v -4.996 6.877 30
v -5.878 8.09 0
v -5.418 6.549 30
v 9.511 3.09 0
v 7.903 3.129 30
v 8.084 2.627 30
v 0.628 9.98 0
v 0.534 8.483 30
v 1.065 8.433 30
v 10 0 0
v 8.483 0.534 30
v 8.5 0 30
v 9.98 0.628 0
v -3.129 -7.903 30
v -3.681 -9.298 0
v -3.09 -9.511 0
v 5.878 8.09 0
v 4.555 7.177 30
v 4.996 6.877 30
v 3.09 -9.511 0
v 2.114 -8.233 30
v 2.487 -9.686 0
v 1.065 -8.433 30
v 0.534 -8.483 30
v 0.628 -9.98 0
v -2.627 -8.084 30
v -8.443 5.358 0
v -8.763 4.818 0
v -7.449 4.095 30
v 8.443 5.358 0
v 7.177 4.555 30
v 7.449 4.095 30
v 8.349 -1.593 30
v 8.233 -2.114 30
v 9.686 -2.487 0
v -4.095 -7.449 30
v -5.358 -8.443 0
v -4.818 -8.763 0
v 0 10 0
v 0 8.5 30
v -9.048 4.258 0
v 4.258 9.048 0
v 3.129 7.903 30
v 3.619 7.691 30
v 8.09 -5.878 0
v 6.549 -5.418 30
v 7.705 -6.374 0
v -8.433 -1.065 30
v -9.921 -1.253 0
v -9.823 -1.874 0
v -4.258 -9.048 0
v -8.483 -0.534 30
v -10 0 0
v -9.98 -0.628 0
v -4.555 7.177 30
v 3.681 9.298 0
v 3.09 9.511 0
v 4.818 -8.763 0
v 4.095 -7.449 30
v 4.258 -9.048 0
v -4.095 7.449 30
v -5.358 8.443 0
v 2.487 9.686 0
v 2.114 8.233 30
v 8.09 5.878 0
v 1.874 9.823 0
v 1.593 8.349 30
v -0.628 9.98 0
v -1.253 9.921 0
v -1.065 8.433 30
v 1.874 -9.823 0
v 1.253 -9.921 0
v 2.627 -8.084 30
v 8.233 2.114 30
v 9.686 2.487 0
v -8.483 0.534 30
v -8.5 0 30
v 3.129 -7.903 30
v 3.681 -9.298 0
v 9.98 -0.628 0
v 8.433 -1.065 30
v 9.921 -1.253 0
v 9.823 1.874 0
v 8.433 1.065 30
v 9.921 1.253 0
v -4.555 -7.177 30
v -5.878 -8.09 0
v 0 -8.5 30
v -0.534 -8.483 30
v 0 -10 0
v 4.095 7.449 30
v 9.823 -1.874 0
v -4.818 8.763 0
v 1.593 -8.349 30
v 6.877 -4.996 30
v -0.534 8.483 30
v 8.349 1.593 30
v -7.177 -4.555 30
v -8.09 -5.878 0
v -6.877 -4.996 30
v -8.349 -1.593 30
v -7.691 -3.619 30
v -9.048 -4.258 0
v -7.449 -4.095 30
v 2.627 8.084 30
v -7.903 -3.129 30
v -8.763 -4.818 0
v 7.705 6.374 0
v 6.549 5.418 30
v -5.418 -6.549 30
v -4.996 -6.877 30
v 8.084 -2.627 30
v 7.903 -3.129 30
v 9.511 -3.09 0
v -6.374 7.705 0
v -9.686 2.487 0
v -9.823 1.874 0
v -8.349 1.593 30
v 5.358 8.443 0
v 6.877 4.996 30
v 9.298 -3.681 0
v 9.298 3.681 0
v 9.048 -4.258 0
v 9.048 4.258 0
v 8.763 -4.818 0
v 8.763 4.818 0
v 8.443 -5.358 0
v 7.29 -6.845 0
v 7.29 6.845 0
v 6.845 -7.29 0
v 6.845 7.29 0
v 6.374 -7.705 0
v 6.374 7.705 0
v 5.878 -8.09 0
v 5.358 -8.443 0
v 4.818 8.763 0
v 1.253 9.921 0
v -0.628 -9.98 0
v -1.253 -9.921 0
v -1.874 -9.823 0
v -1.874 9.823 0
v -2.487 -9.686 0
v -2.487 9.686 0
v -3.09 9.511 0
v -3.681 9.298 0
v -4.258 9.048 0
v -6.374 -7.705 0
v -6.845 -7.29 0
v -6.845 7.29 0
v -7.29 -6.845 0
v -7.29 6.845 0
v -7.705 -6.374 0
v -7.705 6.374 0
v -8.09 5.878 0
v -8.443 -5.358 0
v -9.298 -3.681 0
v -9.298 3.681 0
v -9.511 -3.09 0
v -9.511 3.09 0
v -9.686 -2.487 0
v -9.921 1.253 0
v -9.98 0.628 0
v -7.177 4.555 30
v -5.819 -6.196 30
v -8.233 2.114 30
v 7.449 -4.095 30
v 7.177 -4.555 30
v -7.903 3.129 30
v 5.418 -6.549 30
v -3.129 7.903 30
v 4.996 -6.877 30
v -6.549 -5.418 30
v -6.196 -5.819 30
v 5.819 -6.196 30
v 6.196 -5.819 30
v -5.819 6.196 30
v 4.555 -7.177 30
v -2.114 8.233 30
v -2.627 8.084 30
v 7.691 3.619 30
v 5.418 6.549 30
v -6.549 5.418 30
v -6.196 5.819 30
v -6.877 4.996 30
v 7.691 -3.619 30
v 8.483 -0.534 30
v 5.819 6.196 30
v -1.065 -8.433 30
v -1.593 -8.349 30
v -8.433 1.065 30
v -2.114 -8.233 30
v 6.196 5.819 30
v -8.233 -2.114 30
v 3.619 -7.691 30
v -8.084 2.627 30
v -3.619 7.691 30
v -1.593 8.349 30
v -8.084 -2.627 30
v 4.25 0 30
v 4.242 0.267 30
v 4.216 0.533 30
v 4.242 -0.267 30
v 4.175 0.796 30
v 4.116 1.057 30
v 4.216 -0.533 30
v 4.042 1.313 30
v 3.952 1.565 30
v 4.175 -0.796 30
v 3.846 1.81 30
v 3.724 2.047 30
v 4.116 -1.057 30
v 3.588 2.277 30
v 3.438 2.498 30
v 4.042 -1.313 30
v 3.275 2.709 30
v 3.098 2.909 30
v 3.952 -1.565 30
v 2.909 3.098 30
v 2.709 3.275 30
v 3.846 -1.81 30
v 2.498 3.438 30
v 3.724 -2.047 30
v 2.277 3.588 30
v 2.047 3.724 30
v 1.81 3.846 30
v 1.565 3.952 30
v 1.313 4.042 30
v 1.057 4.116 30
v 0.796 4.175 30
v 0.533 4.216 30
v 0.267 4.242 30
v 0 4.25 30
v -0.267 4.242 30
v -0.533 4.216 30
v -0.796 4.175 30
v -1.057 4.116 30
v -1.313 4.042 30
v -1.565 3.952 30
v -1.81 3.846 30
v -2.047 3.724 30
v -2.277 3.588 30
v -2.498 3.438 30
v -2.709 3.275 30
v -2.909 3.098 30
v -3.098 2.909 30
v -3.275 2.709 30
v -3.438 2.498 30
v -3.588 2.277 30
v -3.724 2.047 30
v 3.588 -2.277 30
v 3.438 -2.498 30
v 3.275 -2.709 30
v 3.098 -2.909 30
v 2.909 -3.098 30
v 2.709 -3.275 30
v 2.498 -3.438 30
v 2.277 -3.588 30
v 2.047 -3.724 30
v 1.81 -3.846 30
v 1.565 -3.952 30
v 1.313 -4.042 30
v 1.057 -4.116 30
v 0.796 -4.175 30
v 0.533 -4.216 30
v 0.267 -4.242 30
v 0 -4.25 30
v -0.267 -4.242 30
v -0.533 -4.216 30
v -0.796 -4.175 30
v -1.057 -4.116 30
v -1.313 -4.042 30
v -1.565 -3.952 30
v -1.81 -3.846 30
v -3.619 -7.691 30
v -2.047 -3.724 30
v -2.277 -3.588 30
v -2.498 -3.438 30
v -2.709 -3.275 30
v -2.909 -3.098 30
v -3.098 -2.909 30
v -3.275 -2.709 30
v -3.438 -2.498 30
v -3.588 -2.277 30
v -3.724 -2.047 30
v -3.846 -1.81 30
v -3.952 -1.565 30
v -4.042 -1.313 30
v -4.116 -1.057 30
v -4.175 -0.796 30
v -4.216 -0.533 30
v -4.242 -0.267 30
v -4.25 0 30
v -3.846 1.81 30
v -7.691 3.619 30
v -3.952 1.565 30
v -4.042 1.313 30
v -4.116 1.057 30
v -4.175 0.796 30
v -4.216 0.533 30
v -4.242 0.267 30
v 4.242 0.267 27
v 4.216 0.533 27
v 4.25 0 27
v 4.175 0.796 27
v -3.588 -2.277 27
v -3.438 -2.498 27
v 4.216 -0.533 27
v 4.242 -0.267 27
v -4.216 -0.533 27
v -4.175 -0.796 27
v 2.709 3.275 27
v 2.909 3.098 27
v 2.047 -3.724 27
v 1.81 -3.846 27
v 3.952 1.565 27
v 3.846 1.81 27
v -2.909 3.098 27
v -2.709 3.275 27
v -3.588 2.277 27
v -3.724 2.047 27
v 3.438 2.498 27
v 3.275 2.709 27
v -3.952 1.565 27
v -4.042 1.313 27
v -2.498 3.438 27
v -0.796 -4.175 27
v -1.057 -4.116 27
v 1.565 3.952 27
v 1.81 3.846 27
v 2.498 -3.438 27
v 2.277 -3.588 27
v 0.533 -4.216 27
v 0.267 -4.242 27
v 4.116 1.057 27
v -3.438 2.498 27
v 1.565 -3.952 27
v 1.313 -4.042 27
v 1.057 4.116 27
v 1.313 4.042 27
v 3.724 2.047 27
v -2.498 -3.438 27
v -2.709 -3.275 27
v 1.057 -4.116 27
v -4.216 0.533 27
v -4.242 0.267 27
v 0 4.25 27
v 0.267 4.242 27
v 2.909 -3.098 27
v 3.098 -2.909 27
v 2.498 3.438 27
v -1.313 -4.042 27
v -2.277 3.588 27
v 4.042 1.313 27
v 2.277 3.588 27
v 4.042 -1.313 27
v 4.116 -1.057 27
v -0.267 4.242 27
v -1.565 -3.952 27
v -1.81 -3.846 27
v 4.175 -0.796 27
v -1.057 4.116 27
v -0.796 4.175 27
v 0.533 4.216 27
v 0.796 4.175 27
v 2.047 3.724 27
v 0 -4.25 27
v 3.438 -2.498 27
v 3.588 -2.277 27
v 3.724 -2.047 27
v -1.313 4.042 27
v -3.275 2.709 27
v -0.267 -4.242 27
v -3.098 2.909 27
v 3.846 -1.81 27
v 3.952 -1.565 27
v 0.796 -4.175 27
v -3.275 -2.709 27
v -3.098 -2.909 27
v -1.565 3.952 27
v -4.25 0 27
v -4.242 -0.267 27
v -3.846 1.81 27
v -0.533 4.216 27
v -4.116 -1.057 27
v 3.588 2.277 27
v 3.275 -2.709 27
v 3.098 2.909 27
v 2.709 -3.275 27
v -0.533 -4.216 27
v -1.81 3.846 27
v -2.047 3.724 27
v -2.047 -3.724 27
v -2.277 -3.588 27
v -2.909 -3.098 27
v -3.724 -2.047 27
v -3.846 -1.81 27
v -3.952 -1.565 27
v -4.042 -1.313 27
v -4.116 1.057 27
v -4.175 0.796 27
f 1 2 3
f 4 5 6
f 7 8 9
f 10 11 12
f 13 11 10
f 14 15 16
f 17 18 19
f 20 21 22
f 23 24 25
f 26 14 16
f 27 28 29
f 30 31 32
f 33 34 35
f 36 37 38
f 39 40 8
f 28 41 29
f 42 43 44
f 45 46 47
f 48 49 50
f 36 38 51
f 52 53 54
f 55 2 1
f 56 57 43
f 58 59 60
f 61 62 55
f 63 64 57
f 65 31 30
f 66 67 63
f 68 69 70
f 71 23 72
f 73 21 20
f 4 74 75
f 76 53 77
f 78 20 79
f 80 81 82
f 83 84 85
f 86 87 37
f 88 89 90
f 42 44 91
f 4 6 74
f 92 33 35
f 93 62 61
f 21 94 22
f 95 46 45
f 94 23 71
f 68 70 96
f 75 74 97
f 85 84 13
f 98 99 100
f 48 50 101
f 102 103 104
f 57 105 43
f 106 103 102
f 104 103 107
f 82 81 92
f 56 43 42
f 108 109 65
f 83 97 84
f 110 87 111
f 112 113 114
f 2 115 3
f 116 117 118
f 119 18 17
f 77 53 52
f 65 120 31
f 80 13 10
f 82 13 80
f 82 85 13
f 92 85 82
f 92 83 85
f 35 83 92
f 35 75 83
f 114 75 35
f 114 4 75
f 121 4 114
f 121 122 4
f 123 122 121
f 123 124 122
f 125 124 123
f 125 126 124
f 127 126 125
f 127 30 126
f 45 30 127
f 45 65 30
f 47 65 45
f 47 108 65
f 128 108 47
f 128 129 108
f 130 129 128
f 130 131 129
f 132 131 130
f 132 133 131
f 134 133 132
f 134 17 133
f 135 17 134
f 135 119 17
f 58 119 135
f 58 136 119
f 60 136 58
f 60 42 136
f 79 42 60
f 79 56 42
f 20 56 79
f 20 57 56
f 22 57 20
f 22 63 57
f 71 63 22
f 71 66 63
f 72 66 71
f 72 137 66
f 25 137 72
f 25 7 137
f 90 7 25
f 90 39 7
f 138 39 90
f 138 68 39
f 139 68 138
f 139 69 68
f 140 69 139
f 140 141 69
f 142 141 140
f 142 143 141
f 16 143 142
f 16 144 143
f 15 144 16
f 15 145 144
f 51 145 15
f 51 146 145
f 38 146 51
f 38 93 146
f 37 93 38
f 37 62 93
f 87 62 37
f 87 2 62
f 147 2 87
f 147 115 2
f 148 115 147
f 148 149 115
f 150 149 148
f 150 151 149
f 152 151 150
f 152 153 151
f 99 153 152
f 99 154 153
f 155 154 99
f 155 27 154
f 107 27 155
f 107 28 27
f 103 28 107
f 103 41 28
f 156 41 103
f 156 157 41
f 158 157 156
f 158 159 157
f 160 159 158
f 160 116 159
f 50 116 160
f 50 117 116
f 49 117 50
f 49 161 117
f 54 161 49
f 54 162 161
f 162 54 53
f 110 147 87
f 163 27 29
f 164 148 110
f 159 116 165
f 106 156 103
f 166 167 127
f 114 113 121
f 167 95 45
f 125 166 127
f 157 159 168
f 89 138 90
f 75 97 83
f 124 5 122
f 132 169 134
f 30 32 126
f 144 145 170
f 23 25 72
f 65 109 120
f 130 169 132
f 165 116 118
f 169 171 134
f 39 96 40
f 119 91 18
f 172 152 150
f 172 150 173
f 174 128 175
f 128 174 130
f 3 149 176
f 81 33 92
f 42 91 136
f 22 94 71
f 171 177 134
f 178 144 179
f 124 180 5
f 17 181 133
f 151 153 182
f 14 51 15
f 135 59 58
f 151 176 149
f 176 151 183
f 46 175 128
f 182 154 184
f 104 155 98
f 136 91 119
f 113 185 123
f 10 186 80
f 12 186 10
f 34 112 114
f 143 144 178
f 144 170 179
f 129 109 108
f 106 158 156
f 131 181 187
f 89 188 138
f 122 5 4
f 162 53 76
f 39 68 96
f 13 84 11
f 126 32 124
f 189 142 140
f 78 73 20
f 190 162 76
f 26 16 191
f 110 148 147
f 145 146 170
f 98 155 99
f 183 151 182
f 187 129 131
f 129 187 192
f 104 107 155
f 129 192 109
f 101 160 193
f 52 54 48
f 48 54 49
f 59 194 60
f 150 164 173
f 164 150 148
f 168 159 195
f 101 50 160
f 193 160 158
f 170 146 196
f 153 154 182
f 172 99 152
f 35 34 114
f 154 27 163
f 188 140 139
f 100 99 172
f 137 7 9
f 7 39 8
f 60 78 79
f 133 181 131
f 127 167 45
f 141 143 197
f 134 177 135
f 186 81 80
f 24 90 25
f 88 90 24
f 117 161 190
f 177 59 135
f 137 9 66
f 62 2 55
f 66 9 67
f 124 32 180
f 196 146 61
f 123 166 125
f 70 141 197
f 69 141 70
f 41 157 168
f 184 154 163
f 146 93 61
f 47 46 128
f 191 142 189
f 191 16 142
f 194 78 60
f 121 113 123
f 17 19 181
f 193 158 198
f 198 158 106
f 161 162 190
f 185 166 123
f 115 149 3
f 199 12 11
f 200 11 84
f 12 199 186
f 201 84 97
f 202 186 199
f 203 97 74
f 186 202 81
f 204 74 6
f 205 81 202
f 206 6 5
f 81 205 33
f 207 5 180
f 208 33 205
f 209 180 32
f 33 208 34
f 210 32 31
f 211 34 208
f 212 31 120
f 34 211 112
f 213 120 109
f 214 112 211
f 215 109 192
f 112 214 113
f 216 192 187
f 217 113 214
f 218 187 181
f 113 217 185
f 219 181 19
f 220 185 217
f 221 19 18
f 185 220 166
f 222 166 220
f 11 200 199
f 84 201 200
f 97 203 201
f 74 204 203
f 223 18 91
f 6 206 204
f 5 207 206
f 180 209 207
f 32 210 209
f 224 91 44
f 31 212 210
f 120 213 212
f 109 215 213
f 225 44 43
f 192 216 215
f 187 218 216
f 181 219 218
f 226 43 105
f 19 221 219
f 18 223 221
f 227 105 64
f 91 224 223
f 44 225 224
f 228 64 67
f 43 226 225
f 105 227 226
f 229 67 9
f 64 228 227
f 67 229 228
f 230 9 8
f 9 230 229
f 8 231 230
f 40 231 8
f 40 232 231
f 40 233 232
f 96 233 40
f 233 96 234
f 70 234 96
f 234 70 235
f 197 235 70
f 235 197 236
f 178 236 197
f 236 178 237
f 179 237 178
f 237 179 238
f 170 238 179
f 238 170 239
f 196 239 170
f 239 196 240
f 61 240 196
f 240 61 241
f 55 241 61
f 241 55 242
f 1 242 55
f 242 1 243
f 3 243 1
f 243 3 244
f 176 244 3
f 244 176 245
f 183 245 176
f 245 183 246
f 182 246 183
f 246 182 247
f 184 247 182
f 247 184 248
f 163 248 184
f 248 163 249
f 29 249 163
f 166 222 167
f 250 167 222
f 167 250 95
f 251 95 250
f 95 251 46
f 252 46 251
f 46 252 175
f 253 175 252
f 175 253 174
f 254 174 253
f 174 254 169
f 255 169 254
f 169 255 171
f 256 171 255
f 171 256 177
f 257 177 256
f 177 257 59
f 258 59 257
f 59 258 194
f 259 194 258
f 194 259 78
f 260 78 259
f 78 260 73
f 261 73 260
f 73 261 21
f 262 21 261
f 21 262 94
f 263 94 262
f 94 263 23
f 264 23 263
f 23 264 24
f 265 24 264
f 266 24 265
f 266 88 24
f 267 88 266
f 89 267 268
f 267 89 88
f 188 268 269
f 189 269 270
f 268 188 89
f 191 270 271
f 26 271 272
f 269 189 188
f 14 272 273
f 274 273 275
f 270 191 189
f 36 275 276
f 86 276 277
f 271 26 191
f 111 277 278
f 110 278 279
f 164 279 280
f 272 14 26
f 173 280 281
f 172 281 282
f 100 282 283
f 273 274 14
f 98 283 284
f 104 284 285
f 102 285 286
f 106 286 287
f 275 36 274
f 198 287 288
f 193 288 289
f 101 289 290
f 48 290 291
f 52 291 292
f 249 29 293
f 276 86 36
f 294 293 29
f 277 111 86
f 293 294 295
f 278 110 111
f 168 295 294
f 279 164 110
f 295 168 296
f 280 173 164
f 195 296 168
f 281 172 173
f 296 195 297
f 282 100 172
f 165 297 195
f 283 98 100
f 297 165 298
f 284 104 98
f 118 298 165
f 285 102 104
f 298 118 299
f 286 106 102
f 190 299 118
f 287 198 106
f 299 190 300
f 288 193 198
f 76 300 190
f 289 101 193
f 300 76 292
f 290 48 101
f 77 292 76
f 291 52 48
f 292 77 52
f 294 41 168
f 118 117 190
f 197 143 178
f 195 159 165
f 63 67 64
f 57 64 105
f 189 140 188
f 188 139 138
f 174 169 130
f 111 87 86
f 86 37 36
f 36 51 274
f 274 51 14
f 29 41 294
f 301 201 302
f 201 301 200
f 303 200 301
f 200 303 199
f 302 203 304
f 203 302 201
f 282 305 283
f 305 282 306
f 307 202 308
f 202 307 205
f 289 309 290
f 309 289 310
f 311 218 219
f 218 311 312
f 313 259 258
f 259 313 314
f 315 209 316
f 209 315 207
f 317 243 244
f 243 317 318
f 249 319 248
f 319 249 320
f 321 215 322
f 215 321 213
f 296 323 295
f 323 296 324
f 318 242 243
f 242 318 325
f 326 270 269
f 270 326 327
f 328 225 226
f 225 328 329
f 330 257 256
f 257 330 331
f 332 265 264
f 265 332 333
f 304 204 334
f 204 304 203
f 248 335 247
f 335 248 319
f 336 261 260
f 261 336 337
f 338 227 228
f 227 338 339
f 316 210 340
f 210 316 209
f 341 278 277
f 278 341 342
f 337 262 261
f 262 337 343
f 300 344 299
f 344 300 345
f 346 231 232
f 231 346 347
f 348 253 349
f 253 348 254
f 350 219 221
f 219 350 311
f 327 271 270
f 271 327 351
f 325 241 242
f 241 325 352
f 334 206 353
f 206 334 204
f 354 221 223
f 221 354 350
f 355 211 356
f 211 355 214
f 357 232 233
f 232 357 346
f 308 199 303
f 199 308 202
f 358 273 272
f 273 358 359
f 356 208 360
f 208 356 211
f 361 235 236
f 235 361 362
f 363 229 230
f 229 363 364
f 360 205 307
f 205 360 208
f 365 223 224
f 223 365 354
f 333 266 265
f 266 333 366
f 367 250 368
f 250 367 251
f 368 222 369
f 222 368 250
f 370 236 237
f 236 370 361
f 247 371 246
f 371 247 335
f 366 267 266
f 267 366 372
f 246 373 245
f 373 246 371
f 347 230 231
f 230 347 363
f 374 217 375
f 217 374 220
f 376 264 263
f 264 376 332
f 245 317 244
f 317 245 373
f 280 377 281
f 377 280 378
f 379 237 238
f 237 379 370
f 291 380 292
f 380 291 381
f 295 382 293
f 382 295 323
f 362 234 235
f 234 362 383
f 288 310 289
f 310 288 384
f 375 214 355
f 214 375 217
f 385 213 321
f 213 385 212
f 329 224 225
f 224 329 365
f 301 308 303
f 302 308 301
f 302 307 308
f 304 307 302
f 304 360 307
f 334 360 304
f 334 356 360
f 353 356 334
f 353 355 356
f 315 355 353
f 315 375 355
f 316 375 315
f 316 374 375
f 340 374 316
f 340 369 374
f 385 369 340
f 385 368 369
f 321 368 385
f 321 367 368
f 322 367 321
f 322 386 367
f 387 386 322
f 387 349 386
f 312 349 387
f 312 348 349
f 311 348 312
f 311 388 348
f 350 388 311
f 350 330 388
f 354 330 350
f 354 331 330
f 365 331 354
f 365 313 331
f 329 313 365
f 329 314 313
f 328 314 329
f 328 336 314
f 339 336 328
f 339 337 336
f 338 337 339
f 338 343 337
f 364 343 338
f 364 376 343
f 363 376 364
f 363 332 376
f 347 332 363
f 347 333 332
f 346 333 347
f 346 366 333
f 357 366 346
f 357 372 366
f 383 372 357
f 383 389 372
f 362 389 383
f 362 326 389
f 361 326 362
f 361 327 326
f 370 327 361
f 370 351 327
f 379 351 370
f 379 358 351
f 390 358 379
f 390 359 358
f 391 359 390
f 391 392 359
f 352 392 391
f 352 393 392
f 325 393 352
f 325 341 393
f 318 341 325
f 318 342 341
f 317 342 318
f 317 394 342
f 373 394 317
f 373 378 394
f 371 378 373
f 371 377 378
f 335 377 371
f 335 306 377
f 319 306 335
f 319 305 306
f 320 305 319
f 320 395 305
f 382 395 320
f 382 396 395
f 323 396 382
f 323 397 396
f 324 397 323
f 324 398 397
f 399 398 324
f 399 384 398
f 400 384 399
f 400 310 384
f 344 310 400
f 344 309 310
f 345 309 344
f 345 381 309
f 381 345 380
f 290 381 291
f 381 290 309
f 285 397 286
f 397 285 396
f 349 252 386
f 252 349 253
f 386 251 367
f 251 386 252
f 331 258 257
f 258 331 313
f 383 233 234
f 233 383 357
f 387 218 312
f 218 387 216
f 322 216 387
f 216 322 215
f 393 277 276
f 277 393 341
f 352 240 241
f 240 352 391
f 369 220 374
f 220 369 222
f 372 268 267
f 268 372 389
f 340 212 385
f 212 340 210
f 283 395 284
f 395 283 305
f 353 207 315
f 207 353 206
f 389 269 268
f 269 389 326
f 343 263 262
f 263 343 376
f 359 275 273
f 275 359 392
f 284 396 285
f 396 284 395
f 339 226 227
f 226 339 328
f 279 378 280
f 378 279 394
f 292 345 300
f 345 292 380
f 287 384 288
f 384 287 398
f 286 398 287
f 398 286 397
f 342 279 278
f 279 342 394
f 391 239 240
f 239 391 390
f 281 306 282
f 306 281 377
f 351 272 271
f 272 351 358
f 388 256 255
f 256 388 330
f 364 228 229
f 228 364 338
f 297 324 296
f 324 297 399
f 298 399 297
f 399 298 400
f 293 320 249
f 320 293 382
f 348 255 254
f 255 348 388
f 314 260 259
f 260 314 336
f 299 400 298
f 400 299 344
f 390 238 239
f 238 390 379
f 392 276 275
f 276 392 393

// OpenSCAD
d1 = 20;
d2 = 17;
h = 30;

$fn=100;

difference() {
	cylinder(d1=d1, d2=d2, h=h);
	translate([0, 0, h-3]) cylinder(d=d2/2, h=h);
}
